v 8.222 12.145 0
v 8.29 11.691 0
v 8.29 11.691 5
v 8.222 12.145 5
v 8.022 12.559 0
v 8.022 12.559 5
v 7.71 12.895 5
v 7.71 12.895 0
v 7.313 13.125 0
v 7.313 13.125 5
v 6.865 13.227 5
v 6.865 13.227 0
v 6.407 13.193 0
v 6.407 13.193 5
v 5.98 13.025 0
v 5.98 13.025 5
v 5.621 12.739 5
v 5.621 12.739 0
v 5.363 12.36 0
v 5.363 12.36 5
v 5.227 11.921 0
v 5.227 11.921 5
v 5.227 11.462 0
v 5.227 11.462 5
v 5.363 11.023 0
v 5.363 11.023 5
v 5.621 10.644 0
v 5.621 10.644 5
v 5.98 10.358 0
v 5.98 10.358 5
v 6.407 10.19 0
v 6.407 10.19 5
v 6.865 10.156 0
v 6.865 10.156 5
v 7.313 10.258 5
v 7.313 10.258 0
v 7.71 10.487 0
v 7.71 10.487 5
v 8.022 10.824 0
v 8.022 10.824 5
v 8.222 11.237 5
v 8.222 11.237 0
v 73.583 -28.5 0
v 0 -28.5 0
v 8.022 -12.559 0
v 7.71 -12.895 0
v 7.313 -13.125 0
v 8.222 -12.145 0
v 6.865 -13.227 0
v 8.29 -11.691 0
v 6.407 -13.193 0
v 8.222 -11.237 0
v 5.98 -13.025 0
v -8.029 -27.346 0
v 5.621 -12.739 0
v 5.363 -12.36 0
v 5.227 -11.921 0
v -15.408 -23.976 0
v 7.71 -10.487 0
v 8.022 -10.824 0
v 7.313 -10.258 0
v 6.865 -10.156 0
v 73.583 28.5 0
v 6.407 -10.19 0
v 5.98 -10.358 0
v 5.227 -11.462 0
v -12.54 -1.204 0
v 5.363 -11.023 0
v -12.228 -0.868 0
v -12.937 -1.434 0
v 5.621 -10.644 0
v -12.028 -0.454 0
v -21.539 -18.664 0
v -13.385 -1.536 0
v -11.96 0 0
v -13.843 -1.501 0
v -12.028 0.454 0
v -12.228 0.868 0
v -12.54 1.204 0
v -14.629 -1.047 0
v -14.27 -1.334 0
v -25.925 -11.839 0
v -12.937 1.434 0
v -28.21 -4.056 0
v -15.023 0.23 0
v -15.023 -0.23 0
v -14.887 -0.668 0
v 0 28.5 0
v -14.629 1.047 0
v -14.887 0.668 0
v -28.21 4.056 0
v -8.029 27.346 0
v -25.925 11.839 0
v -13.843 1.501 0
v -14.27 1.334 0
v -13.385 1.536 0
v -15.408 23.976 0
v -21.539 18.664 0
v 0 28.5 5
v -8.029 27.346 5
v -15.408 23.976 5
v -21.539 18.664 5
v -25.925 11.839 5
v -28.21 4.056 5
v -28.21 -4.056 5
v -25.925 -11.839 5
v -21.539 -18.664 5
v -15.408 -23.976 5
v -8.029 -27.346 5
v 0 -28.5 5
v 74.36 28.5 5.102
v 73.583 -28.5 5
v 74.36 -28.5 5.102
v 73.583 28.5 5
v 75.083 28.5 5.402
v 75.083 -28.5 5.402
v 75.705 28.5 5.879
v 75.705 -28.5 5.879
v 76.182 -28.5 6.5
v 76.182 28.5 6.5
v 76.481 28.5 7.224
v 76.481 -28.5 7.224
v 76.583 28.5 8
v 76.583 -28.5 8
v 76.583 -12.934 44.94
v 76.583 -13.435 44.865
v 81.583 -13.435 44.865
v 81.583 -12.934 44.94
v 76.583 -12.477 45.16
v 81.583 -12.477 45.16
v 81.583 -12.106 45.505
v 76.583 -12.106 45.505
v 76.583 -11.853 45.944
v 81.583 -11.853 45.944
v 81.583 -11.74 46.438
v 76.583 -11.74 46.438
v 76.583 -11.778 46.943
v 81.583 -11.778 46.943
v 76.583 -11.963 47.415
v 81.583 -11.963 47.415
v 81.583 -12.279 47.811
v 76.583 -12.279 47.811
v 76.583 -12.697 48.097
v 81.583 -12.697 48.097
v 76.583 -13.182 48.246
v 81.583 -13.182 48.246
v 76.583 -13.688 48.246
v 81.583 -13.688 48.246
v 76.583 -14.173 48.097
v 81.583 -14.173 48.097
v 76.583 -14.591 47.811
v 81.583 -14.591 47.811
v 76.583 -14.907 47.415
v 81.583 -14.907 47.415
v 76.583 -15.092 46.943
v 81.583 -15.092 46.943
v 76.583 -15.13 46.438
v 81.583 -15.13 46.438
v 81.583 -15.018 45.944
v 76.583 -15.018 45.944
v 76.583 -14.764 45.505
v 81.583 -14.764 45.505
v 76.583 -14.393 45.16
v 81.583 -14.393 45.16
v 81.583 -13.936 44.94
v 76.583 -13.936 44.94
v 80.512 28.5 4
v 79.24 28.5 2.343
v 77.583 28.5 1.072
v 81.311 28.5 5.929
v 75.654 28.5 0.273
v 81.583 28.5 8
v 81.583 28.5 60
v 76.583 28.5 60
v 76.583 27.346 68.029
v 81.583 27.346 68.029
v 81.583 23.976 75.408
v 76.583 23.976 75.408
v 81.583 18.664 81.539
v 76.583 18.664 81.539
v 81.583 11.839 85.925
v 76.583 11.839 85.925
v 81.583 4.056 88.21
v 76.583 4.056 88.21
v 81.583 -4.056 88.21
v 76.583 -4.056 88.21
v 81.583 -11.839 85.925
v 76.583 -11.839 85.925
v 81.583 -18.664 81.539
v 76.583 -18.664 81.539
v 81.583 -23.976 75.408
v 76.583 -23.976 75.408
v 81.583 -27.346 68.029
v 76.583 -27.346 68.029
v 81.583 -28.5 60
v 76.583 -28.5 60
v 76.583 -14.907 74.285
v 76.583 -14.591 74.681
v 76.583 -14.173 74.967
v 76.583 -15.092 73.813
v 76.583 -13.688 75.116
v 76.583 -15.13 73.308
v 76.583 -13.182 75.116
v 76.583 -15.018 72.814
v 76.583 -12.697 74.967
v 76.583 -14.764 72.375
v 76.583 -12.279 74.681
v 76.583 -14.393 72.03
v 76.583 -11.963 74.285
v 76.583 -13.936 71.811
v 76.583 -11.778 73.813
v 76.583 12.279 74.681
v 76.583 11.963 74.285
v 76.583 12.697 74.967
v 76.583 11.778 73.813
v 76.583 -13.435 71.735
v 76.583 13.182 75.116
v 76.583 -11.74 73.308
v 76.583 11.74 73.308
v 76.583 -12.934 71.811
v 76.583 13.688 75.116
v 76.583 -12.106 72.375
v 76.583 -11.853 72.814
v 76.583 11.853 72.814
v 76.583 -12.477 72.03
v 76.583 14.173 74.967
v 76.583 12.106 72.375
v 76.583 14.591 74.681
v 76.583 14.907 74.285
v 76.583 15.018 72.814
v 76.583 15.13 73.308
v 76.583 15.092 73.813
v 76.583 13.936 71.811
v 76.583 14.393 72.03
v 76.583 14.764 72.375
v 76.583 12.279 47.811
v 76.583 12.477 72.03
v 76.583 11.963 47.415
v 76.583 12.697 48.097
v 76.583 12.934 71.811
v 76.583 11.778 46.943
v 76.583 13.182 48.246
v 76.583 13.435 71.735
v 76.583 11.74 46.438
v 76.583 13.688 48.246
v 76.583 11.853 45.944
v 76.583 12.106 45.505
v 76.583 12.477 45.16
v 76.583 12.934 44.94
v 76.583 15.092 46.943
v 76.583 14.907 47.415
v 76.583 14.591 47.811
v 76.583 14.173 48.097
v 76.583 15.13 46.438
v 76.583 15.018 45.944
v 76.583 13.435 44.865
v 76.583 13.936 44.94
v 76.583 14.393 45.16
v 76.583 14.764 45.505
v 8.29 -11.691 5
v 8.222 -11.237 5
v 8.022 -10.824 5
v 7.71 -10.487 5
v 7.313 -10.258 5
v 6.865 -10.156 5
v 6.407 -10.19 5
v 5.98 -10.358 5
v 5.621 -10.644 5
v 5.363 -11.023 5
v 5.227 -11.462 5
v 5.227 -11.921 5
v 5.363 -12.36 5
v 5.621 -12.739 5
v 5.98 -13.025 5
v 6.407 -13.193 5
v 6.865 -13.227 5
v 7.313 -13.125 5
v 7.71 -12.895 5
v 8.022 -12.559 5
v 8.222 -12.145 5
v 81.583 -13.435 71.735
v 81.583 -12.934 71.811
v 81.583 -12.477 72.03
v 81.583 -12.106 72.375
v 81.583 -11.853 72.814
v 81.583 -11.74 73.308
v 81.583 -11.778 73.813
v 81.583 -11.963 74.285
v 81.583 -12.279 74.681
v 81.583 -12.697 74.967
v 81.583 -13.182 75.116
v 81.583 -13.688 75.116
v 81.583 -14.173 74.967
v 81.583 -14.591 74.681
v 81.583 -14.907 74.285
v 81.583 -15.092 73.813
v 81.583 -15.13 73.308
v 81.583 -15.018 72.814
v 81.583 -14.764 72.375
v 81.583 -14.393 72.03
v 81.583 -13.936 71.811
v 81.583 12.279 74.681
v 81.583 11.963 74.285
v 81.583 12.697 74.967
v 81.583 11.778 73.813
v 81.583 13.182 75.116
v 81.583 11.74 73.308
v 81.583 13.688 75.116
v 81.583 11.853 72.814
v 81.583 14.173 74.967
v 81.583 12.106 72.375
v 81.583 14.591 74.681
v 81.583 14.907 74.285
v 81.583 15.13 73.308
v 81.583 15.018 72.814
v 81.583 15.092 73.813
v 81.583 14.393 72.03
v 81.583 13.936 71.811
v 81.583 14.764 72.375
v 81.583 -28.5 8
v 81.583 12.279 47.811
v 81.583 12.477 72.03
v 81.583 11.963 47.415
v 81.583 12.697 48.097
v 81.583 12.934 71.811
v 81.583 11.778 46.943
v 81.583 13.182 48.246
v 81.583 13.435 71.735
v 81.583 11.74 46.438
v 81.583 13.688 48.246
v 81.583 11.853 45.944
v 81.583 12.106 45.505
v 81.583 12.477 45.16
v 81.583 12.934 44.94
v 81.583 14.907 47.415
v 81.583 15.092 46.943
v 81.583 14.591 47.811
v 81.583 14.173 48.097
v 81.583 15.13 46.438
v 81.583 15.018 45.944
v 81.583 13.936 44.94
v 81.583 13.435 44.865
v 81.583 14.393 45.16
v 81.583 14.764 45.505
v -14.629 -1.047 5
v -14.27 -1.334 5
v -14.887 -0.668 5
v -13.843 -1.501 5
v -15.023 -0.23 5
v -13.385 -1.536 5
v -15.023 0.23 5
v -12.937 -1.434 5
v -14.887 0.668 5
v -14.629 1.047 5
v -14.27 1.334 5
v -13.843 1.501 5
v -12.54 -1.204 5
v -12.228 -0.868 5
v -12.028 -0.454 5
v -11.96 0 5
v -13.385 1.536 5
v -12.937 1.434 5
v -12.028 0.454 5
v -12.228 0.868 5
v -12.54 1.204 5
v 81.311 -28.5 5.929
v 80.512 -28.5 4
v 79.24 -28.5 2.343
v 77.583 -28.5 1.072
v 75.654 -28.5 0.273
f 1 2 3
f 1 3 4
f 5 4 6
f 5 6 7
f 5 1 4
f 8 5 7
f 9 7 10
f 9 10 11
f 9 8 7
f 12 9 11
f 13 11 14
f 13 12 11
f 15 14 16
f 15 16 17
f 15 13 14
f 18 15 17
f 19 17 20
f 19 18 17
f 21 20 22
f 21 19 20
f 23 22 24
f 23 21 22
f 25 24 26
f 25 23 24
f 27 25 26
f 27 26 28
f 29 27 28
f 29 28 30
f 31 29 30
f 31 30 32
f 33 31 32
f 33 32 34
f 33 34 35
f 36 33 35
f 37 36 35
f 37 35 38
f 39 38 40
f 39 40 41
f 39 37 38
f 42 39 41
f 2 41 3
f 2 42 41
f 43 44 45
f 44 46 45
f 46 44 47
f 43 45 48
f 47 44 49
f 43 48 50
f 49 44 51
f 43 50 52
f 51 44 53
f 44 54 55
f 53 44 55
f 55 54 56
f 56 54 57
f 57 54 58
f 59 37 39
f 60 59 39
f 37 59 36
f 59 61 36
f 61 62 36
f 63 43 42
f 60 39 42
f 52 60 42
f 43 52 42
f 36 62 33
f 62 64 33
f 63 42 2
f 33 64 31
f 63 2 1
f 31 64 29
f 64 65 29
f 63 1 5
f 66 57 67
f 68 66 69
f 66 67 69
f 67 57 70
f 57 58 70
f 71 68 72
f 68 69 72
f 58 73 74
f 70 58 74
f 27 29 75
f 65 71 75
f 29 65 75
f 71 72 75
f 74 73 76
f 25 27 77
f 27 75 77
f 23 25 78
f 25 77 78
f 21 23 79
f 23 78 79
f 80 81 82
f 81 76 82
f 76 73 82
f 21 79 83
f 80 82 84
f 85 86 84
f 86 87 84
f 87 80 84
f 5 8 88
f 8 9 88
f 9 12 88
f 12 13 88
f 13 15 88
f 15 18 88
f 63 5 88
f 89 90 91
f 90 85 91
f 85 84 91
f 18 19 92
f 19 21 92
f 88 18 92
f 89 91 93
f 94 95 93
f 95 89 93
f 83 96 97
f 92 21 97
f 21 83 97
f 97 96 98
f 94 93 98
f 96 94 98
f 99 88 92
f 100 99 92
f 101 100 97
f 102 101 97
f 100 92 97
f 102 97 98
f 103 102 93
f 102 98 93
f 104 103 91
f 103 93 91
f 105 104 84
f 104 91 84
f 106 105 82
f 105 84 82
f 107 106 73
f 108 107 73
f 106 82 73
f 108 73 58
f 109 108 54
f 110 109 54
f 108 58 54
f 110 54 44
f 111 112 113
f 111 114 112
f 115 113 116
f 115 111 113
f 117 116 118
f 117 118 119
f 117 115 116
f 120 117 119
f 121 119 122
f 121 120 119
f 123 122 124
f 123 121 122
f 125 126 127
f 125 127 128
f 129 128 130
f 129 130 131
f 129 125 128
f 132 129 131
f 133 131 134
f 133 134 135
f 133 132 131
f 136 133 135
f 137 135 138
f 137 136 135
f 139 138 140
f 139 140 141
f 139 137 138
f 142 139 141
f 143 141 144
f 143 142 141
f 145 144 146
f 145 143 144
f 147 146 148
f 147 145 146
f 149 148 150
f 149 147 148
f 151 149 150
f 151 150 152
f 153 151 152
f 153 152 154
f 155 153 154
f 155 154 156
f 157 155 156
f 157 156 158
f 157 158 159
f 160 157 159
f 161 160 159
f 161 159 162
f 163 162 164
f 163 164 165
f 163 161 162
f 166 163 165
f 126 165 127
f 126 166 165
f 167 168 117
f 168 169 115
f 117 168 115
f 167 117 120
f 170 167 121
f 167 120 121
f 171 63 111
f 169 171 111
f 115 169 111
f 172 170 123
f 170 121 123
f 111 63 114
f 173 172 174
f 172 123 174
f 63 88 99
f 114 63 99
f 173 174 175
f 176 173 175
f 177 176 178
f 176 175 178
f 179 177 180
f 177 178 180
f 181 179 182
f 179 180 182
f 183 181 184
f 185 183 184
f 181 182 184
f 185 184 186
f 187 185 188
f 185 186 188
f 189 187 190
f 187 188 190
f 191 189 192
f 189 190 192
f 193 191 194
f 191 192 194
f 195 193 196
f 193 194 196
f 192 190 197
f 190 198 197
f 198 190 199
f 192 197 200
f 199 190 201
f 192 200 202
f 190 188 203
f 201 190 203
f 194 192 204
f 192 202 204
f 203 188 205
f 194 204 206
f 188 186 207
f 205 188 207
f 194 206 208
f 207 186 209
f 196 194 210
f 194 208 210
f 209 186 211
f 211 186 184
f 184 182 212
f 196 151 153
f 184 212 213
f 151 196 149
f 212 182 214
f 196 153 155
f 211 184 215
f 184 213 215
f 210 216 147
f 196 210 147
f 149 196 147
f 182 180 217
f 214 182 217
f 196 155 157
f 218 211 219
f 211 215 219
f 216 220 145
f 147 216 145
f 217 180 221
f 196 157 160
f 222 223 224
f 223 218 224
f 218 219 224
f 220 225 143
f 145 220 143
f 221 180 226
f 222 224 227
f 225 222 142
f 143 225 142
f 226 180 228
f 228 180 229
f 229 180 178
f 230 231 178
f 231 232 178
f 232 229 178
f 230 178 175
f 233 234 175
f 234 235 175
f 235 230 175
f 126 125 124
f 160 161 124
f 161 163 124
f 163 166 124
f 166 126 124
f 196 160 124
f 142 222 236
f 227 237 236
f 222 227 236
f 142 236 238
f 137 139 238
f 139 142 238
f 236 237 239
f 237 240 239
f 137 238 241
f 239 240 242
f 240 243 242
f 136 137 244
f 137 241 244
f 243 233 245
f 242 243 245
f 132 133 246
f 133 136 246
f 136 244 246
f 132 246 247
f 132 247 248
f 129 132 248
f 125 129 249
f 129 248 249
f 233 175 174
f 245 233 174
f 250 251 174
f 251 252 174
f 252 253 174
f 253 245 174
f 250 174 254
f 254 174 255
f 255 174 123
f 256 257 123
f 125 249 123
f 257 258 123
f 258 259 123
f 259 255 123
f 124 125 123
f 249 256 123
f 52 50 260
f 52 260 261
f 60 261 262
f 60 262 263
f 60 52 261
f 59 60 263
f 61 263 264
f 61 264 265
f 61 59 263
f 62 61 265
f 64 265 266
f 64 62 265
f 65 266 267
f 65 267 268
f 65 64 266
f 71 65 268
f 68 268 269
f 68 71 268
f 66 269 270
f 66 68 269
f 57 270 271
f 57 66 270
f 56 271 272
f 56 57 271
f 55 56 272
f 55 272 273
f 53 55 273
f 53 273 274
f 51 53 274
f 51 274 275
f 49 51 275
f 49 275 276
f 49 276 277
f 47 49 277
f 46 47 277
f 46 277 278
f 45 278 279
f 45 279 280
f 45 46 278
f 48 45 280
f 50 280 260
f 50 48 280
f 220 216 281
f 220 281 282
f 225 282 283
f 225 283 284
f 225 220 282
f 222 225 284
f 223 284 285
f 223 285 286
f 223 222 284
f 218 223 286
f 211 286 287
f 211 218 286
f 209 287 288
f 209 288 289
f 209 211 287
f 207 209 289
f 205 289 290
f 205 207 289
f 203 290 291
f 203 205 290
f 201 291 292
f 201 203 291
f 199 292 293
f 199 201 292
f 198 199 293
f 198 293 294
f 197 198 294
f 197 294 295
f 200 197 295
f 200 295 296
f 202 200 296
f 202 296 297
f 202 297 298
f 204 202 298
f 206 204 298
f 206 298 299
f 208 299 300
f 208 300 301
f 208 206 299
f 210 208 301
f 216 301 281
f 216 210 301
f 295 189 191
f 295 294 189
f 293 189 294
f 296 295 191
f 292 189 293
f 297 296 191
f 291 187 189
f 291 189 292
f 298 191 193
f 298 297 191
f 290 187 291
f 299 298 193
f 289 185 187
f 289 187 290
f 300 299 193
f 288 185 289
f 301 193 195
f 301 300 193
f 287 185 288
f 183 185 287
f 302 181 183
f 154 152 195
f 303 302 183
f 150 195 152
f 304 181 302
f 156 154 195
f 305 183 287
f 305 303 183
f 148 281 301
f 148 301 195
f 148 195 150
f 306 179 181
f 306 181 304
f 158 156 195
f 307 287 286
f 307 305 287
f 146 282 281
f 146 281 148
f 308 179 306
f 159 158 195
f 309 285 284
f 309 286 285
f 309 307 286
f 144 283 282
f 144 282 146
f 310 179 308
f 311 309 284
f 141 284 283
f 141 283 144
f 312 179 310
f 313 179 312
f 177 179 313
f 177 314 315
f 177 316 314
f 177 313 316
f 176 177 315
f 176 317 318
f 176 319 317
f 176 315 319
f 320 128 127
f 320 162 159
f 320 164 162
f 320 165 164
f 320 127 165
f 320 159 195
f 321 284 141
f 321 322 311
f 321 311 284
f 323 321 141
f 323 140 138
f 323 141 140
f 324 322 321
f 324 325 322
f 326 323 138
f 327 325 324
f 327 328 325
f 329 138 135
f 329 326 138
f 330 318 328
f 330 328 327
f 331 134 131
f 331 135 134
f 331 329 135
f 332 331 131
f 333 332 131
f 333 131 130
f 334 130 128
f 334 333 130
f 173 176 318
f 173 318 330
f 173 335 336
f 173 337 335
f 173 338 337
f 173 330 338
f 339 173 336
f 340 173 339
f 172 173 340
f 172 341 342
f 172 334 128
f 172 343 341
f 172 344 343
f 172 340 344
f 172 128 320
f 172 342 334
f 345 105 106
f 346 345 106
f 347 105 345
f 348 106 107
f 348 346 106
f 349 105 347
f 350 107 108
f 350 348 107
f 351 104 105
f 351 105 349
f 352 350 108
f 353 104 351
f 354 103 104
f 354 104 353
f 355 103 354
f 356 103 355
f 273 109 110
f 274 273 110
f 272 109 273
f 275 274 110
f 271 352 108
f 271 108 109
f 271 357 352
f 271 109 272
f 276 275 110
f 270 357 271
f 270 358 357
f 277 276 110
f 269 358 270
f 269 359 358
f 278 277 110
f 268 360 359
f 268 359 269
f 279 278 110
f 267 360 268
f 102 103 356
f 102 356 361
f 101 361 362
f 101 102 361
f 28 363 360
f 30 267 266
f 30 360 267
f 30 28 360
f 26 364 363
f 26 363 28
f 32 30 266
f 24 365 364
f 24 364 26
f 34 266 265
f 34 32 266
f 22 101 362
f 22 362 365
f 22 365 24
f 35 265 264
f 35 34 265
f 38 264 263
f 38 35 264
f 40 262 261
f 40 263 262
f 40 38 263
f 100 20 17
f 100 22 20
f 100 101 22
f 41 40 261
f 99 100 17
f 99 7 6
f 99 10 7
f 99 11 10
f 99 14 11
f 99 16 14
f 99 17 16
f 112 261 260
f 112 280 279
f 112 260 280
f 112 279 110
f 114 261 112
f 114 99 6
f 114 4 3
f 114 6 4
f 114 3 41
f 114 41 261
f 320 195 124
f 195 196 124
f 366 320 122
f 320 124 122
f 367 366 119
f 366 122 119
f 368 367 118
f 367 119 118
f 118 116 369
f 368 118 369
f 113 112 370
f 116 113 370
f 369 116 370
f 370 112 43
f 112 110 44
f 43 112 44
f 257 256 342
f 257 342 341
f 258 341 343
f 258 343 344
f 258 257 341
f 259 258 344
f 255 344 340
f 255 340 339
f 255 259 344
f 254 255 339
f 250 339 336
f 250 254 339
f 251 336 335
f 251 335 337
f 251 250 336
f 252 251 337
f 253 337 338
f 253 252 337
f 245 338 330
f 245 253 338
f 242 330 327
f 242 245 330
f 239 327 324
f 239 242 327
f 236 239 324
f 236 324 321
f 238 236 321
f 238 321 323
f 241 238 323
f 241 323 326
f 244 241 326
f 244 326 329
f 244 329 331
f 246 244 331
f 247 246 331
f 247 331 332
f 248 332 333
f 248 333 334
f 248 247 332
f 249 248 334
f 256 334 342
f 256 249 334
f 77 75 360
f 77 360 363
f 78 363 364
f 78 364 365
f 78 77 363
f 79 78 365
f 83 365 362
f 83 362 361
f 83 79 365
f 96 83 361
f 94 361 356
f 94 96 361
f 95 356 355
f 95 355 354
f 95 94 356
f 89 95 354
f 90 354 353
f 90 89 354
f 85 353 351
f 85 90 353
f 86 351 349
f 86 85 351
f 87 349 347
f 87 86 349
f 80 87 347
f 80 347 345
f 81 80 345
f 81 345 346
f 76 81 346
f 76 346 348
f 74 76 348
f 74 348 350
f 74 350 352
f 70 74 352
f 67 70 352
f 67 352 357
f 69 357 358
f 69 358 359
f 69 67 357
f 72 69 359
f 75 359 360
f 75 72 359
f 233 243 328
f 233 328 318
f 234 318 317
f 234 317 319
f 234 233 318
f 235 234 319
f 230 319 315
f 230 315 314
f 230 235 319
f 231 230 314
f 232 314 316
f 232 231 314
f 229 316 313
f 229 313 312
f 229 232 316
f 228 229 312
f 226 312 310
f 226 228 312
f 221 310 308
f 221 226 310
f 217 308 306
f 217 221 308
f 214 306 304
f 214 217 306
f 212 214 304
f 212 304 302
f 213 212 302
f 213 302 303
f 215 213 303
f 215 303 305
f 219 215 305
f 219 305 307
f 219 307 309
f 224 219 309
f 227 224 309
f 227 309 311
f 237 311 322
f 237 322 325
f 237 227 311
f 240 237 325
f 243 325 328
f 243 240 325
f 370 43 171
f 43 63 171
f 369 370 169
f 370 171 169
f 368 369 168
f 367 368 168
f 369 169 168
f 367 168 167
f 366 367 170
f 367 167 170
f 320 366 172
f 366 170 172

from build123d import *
from OCP.BRepFilletAPI import BRepFilletAPI_MakeFillet

# Parameters (mm, degrees)
SKETCH_1_R      = 1.54
EXTRUDE_1_DEPTH = 5
SKETCH_2_R      = 1.7
EXTRUDE_2_DEPTH = 5
FILLET_1_R1     = 3
FILLET_1_R2     = 8


with BuildPart() as part:
    # 草图1 → 凸台-拉伸1 (new body)
    with BuildSketch(Plane.XY):
        with BuildLine():
            Line((0, -28.5), (76.583465403, -28.5))
            Line((76.583465403, -28.5), (76.583465403, 28.5))
            Line((76.583465403, 28.5), (0, 28.5))
            ThreePointArc((0, 28.5), (-28.5, 0), (0, -28.5))
        make_face()
        with Locations((-13.5, 0)):
            Circle(SKETCH_1_R, mode=Mode.SUBTRACT)
        with Locations((6.75, 11.691342951)):
            Circle(SKETCH_1_R, mode=Mode.SUBTRACT)
        with Locations((6.75, -11.691342951)):
            Circle(SKETCH_1_R, mode=Mode.SUBTRACT)
    extrude(amount=EXTRUDE_1_DEPTH)

    # 草图2 → 凸台-拉伸2 (add)
    with BuildSketch(Plane(origin=(76.583465403, 0, 0), x_dir=(0, 0, -1), z_dir=(1, 0, 0))):
        with BuildLine():
            Line((0, -28.5), (0, 28.5))
            Line((0, 28.5), (-60, 28.5))
            ThreePointArc((-60, 28.5), (-88.5, 0), (-60, -28.5))
            Line((-60, -28.5), (0, -28.5))
        make_face()
        with Locations((-73.435028843, -13.435028843)):
            Circle(SKETCH_2_R, mode=Mode.SUBTRACT)
        with Locations((-73.435028843, 13.435028843)):
            Circle(SKETCH_2_R, mode=Mode.SUBTRACT)
        with Locations((-46.564971157, 13.435028843)):
            Circle(SKETCH_2_R, mode=Mode.SUBTRACT)
        with Locations((-46.564971157, -13.435028843)):
            Circle(SKETCH_2_R, mode=Mode.SUBTRACT)
    extrude(amount=EXTRUDE_2_DEPTH)

    # 圆角1: one fillet with a radius per group of edges: ONE call of the kernel's fillet builder (fillet() takes one radius for all edges)
    fillet_1_edges_1 = [part.edges().sort_by_distance(p)[0] for p in [
        (76.583465403, 0, 5),
    ]]
    fillet_1_edges_2 = [part.edges().sort_by_distance(p)[0] for p in [
        (81.583465403, 0, 0),
    ]]
    fillet_1 = BRepFilletAPI_MakeFillet(part.part.solid().wrapped)
    for e in fillet_1_edges_1:
        fillet_1.Add(FILLET_1_R1, e.wrapped)
    for e in fillet_1_edges_2:
        fillet_1.Add(FILLET_1_R2, e.wrapped)
    add(Compound.cast(fillet_1.Shape()), mode=Mode.REPLACE)


solid = part.part
